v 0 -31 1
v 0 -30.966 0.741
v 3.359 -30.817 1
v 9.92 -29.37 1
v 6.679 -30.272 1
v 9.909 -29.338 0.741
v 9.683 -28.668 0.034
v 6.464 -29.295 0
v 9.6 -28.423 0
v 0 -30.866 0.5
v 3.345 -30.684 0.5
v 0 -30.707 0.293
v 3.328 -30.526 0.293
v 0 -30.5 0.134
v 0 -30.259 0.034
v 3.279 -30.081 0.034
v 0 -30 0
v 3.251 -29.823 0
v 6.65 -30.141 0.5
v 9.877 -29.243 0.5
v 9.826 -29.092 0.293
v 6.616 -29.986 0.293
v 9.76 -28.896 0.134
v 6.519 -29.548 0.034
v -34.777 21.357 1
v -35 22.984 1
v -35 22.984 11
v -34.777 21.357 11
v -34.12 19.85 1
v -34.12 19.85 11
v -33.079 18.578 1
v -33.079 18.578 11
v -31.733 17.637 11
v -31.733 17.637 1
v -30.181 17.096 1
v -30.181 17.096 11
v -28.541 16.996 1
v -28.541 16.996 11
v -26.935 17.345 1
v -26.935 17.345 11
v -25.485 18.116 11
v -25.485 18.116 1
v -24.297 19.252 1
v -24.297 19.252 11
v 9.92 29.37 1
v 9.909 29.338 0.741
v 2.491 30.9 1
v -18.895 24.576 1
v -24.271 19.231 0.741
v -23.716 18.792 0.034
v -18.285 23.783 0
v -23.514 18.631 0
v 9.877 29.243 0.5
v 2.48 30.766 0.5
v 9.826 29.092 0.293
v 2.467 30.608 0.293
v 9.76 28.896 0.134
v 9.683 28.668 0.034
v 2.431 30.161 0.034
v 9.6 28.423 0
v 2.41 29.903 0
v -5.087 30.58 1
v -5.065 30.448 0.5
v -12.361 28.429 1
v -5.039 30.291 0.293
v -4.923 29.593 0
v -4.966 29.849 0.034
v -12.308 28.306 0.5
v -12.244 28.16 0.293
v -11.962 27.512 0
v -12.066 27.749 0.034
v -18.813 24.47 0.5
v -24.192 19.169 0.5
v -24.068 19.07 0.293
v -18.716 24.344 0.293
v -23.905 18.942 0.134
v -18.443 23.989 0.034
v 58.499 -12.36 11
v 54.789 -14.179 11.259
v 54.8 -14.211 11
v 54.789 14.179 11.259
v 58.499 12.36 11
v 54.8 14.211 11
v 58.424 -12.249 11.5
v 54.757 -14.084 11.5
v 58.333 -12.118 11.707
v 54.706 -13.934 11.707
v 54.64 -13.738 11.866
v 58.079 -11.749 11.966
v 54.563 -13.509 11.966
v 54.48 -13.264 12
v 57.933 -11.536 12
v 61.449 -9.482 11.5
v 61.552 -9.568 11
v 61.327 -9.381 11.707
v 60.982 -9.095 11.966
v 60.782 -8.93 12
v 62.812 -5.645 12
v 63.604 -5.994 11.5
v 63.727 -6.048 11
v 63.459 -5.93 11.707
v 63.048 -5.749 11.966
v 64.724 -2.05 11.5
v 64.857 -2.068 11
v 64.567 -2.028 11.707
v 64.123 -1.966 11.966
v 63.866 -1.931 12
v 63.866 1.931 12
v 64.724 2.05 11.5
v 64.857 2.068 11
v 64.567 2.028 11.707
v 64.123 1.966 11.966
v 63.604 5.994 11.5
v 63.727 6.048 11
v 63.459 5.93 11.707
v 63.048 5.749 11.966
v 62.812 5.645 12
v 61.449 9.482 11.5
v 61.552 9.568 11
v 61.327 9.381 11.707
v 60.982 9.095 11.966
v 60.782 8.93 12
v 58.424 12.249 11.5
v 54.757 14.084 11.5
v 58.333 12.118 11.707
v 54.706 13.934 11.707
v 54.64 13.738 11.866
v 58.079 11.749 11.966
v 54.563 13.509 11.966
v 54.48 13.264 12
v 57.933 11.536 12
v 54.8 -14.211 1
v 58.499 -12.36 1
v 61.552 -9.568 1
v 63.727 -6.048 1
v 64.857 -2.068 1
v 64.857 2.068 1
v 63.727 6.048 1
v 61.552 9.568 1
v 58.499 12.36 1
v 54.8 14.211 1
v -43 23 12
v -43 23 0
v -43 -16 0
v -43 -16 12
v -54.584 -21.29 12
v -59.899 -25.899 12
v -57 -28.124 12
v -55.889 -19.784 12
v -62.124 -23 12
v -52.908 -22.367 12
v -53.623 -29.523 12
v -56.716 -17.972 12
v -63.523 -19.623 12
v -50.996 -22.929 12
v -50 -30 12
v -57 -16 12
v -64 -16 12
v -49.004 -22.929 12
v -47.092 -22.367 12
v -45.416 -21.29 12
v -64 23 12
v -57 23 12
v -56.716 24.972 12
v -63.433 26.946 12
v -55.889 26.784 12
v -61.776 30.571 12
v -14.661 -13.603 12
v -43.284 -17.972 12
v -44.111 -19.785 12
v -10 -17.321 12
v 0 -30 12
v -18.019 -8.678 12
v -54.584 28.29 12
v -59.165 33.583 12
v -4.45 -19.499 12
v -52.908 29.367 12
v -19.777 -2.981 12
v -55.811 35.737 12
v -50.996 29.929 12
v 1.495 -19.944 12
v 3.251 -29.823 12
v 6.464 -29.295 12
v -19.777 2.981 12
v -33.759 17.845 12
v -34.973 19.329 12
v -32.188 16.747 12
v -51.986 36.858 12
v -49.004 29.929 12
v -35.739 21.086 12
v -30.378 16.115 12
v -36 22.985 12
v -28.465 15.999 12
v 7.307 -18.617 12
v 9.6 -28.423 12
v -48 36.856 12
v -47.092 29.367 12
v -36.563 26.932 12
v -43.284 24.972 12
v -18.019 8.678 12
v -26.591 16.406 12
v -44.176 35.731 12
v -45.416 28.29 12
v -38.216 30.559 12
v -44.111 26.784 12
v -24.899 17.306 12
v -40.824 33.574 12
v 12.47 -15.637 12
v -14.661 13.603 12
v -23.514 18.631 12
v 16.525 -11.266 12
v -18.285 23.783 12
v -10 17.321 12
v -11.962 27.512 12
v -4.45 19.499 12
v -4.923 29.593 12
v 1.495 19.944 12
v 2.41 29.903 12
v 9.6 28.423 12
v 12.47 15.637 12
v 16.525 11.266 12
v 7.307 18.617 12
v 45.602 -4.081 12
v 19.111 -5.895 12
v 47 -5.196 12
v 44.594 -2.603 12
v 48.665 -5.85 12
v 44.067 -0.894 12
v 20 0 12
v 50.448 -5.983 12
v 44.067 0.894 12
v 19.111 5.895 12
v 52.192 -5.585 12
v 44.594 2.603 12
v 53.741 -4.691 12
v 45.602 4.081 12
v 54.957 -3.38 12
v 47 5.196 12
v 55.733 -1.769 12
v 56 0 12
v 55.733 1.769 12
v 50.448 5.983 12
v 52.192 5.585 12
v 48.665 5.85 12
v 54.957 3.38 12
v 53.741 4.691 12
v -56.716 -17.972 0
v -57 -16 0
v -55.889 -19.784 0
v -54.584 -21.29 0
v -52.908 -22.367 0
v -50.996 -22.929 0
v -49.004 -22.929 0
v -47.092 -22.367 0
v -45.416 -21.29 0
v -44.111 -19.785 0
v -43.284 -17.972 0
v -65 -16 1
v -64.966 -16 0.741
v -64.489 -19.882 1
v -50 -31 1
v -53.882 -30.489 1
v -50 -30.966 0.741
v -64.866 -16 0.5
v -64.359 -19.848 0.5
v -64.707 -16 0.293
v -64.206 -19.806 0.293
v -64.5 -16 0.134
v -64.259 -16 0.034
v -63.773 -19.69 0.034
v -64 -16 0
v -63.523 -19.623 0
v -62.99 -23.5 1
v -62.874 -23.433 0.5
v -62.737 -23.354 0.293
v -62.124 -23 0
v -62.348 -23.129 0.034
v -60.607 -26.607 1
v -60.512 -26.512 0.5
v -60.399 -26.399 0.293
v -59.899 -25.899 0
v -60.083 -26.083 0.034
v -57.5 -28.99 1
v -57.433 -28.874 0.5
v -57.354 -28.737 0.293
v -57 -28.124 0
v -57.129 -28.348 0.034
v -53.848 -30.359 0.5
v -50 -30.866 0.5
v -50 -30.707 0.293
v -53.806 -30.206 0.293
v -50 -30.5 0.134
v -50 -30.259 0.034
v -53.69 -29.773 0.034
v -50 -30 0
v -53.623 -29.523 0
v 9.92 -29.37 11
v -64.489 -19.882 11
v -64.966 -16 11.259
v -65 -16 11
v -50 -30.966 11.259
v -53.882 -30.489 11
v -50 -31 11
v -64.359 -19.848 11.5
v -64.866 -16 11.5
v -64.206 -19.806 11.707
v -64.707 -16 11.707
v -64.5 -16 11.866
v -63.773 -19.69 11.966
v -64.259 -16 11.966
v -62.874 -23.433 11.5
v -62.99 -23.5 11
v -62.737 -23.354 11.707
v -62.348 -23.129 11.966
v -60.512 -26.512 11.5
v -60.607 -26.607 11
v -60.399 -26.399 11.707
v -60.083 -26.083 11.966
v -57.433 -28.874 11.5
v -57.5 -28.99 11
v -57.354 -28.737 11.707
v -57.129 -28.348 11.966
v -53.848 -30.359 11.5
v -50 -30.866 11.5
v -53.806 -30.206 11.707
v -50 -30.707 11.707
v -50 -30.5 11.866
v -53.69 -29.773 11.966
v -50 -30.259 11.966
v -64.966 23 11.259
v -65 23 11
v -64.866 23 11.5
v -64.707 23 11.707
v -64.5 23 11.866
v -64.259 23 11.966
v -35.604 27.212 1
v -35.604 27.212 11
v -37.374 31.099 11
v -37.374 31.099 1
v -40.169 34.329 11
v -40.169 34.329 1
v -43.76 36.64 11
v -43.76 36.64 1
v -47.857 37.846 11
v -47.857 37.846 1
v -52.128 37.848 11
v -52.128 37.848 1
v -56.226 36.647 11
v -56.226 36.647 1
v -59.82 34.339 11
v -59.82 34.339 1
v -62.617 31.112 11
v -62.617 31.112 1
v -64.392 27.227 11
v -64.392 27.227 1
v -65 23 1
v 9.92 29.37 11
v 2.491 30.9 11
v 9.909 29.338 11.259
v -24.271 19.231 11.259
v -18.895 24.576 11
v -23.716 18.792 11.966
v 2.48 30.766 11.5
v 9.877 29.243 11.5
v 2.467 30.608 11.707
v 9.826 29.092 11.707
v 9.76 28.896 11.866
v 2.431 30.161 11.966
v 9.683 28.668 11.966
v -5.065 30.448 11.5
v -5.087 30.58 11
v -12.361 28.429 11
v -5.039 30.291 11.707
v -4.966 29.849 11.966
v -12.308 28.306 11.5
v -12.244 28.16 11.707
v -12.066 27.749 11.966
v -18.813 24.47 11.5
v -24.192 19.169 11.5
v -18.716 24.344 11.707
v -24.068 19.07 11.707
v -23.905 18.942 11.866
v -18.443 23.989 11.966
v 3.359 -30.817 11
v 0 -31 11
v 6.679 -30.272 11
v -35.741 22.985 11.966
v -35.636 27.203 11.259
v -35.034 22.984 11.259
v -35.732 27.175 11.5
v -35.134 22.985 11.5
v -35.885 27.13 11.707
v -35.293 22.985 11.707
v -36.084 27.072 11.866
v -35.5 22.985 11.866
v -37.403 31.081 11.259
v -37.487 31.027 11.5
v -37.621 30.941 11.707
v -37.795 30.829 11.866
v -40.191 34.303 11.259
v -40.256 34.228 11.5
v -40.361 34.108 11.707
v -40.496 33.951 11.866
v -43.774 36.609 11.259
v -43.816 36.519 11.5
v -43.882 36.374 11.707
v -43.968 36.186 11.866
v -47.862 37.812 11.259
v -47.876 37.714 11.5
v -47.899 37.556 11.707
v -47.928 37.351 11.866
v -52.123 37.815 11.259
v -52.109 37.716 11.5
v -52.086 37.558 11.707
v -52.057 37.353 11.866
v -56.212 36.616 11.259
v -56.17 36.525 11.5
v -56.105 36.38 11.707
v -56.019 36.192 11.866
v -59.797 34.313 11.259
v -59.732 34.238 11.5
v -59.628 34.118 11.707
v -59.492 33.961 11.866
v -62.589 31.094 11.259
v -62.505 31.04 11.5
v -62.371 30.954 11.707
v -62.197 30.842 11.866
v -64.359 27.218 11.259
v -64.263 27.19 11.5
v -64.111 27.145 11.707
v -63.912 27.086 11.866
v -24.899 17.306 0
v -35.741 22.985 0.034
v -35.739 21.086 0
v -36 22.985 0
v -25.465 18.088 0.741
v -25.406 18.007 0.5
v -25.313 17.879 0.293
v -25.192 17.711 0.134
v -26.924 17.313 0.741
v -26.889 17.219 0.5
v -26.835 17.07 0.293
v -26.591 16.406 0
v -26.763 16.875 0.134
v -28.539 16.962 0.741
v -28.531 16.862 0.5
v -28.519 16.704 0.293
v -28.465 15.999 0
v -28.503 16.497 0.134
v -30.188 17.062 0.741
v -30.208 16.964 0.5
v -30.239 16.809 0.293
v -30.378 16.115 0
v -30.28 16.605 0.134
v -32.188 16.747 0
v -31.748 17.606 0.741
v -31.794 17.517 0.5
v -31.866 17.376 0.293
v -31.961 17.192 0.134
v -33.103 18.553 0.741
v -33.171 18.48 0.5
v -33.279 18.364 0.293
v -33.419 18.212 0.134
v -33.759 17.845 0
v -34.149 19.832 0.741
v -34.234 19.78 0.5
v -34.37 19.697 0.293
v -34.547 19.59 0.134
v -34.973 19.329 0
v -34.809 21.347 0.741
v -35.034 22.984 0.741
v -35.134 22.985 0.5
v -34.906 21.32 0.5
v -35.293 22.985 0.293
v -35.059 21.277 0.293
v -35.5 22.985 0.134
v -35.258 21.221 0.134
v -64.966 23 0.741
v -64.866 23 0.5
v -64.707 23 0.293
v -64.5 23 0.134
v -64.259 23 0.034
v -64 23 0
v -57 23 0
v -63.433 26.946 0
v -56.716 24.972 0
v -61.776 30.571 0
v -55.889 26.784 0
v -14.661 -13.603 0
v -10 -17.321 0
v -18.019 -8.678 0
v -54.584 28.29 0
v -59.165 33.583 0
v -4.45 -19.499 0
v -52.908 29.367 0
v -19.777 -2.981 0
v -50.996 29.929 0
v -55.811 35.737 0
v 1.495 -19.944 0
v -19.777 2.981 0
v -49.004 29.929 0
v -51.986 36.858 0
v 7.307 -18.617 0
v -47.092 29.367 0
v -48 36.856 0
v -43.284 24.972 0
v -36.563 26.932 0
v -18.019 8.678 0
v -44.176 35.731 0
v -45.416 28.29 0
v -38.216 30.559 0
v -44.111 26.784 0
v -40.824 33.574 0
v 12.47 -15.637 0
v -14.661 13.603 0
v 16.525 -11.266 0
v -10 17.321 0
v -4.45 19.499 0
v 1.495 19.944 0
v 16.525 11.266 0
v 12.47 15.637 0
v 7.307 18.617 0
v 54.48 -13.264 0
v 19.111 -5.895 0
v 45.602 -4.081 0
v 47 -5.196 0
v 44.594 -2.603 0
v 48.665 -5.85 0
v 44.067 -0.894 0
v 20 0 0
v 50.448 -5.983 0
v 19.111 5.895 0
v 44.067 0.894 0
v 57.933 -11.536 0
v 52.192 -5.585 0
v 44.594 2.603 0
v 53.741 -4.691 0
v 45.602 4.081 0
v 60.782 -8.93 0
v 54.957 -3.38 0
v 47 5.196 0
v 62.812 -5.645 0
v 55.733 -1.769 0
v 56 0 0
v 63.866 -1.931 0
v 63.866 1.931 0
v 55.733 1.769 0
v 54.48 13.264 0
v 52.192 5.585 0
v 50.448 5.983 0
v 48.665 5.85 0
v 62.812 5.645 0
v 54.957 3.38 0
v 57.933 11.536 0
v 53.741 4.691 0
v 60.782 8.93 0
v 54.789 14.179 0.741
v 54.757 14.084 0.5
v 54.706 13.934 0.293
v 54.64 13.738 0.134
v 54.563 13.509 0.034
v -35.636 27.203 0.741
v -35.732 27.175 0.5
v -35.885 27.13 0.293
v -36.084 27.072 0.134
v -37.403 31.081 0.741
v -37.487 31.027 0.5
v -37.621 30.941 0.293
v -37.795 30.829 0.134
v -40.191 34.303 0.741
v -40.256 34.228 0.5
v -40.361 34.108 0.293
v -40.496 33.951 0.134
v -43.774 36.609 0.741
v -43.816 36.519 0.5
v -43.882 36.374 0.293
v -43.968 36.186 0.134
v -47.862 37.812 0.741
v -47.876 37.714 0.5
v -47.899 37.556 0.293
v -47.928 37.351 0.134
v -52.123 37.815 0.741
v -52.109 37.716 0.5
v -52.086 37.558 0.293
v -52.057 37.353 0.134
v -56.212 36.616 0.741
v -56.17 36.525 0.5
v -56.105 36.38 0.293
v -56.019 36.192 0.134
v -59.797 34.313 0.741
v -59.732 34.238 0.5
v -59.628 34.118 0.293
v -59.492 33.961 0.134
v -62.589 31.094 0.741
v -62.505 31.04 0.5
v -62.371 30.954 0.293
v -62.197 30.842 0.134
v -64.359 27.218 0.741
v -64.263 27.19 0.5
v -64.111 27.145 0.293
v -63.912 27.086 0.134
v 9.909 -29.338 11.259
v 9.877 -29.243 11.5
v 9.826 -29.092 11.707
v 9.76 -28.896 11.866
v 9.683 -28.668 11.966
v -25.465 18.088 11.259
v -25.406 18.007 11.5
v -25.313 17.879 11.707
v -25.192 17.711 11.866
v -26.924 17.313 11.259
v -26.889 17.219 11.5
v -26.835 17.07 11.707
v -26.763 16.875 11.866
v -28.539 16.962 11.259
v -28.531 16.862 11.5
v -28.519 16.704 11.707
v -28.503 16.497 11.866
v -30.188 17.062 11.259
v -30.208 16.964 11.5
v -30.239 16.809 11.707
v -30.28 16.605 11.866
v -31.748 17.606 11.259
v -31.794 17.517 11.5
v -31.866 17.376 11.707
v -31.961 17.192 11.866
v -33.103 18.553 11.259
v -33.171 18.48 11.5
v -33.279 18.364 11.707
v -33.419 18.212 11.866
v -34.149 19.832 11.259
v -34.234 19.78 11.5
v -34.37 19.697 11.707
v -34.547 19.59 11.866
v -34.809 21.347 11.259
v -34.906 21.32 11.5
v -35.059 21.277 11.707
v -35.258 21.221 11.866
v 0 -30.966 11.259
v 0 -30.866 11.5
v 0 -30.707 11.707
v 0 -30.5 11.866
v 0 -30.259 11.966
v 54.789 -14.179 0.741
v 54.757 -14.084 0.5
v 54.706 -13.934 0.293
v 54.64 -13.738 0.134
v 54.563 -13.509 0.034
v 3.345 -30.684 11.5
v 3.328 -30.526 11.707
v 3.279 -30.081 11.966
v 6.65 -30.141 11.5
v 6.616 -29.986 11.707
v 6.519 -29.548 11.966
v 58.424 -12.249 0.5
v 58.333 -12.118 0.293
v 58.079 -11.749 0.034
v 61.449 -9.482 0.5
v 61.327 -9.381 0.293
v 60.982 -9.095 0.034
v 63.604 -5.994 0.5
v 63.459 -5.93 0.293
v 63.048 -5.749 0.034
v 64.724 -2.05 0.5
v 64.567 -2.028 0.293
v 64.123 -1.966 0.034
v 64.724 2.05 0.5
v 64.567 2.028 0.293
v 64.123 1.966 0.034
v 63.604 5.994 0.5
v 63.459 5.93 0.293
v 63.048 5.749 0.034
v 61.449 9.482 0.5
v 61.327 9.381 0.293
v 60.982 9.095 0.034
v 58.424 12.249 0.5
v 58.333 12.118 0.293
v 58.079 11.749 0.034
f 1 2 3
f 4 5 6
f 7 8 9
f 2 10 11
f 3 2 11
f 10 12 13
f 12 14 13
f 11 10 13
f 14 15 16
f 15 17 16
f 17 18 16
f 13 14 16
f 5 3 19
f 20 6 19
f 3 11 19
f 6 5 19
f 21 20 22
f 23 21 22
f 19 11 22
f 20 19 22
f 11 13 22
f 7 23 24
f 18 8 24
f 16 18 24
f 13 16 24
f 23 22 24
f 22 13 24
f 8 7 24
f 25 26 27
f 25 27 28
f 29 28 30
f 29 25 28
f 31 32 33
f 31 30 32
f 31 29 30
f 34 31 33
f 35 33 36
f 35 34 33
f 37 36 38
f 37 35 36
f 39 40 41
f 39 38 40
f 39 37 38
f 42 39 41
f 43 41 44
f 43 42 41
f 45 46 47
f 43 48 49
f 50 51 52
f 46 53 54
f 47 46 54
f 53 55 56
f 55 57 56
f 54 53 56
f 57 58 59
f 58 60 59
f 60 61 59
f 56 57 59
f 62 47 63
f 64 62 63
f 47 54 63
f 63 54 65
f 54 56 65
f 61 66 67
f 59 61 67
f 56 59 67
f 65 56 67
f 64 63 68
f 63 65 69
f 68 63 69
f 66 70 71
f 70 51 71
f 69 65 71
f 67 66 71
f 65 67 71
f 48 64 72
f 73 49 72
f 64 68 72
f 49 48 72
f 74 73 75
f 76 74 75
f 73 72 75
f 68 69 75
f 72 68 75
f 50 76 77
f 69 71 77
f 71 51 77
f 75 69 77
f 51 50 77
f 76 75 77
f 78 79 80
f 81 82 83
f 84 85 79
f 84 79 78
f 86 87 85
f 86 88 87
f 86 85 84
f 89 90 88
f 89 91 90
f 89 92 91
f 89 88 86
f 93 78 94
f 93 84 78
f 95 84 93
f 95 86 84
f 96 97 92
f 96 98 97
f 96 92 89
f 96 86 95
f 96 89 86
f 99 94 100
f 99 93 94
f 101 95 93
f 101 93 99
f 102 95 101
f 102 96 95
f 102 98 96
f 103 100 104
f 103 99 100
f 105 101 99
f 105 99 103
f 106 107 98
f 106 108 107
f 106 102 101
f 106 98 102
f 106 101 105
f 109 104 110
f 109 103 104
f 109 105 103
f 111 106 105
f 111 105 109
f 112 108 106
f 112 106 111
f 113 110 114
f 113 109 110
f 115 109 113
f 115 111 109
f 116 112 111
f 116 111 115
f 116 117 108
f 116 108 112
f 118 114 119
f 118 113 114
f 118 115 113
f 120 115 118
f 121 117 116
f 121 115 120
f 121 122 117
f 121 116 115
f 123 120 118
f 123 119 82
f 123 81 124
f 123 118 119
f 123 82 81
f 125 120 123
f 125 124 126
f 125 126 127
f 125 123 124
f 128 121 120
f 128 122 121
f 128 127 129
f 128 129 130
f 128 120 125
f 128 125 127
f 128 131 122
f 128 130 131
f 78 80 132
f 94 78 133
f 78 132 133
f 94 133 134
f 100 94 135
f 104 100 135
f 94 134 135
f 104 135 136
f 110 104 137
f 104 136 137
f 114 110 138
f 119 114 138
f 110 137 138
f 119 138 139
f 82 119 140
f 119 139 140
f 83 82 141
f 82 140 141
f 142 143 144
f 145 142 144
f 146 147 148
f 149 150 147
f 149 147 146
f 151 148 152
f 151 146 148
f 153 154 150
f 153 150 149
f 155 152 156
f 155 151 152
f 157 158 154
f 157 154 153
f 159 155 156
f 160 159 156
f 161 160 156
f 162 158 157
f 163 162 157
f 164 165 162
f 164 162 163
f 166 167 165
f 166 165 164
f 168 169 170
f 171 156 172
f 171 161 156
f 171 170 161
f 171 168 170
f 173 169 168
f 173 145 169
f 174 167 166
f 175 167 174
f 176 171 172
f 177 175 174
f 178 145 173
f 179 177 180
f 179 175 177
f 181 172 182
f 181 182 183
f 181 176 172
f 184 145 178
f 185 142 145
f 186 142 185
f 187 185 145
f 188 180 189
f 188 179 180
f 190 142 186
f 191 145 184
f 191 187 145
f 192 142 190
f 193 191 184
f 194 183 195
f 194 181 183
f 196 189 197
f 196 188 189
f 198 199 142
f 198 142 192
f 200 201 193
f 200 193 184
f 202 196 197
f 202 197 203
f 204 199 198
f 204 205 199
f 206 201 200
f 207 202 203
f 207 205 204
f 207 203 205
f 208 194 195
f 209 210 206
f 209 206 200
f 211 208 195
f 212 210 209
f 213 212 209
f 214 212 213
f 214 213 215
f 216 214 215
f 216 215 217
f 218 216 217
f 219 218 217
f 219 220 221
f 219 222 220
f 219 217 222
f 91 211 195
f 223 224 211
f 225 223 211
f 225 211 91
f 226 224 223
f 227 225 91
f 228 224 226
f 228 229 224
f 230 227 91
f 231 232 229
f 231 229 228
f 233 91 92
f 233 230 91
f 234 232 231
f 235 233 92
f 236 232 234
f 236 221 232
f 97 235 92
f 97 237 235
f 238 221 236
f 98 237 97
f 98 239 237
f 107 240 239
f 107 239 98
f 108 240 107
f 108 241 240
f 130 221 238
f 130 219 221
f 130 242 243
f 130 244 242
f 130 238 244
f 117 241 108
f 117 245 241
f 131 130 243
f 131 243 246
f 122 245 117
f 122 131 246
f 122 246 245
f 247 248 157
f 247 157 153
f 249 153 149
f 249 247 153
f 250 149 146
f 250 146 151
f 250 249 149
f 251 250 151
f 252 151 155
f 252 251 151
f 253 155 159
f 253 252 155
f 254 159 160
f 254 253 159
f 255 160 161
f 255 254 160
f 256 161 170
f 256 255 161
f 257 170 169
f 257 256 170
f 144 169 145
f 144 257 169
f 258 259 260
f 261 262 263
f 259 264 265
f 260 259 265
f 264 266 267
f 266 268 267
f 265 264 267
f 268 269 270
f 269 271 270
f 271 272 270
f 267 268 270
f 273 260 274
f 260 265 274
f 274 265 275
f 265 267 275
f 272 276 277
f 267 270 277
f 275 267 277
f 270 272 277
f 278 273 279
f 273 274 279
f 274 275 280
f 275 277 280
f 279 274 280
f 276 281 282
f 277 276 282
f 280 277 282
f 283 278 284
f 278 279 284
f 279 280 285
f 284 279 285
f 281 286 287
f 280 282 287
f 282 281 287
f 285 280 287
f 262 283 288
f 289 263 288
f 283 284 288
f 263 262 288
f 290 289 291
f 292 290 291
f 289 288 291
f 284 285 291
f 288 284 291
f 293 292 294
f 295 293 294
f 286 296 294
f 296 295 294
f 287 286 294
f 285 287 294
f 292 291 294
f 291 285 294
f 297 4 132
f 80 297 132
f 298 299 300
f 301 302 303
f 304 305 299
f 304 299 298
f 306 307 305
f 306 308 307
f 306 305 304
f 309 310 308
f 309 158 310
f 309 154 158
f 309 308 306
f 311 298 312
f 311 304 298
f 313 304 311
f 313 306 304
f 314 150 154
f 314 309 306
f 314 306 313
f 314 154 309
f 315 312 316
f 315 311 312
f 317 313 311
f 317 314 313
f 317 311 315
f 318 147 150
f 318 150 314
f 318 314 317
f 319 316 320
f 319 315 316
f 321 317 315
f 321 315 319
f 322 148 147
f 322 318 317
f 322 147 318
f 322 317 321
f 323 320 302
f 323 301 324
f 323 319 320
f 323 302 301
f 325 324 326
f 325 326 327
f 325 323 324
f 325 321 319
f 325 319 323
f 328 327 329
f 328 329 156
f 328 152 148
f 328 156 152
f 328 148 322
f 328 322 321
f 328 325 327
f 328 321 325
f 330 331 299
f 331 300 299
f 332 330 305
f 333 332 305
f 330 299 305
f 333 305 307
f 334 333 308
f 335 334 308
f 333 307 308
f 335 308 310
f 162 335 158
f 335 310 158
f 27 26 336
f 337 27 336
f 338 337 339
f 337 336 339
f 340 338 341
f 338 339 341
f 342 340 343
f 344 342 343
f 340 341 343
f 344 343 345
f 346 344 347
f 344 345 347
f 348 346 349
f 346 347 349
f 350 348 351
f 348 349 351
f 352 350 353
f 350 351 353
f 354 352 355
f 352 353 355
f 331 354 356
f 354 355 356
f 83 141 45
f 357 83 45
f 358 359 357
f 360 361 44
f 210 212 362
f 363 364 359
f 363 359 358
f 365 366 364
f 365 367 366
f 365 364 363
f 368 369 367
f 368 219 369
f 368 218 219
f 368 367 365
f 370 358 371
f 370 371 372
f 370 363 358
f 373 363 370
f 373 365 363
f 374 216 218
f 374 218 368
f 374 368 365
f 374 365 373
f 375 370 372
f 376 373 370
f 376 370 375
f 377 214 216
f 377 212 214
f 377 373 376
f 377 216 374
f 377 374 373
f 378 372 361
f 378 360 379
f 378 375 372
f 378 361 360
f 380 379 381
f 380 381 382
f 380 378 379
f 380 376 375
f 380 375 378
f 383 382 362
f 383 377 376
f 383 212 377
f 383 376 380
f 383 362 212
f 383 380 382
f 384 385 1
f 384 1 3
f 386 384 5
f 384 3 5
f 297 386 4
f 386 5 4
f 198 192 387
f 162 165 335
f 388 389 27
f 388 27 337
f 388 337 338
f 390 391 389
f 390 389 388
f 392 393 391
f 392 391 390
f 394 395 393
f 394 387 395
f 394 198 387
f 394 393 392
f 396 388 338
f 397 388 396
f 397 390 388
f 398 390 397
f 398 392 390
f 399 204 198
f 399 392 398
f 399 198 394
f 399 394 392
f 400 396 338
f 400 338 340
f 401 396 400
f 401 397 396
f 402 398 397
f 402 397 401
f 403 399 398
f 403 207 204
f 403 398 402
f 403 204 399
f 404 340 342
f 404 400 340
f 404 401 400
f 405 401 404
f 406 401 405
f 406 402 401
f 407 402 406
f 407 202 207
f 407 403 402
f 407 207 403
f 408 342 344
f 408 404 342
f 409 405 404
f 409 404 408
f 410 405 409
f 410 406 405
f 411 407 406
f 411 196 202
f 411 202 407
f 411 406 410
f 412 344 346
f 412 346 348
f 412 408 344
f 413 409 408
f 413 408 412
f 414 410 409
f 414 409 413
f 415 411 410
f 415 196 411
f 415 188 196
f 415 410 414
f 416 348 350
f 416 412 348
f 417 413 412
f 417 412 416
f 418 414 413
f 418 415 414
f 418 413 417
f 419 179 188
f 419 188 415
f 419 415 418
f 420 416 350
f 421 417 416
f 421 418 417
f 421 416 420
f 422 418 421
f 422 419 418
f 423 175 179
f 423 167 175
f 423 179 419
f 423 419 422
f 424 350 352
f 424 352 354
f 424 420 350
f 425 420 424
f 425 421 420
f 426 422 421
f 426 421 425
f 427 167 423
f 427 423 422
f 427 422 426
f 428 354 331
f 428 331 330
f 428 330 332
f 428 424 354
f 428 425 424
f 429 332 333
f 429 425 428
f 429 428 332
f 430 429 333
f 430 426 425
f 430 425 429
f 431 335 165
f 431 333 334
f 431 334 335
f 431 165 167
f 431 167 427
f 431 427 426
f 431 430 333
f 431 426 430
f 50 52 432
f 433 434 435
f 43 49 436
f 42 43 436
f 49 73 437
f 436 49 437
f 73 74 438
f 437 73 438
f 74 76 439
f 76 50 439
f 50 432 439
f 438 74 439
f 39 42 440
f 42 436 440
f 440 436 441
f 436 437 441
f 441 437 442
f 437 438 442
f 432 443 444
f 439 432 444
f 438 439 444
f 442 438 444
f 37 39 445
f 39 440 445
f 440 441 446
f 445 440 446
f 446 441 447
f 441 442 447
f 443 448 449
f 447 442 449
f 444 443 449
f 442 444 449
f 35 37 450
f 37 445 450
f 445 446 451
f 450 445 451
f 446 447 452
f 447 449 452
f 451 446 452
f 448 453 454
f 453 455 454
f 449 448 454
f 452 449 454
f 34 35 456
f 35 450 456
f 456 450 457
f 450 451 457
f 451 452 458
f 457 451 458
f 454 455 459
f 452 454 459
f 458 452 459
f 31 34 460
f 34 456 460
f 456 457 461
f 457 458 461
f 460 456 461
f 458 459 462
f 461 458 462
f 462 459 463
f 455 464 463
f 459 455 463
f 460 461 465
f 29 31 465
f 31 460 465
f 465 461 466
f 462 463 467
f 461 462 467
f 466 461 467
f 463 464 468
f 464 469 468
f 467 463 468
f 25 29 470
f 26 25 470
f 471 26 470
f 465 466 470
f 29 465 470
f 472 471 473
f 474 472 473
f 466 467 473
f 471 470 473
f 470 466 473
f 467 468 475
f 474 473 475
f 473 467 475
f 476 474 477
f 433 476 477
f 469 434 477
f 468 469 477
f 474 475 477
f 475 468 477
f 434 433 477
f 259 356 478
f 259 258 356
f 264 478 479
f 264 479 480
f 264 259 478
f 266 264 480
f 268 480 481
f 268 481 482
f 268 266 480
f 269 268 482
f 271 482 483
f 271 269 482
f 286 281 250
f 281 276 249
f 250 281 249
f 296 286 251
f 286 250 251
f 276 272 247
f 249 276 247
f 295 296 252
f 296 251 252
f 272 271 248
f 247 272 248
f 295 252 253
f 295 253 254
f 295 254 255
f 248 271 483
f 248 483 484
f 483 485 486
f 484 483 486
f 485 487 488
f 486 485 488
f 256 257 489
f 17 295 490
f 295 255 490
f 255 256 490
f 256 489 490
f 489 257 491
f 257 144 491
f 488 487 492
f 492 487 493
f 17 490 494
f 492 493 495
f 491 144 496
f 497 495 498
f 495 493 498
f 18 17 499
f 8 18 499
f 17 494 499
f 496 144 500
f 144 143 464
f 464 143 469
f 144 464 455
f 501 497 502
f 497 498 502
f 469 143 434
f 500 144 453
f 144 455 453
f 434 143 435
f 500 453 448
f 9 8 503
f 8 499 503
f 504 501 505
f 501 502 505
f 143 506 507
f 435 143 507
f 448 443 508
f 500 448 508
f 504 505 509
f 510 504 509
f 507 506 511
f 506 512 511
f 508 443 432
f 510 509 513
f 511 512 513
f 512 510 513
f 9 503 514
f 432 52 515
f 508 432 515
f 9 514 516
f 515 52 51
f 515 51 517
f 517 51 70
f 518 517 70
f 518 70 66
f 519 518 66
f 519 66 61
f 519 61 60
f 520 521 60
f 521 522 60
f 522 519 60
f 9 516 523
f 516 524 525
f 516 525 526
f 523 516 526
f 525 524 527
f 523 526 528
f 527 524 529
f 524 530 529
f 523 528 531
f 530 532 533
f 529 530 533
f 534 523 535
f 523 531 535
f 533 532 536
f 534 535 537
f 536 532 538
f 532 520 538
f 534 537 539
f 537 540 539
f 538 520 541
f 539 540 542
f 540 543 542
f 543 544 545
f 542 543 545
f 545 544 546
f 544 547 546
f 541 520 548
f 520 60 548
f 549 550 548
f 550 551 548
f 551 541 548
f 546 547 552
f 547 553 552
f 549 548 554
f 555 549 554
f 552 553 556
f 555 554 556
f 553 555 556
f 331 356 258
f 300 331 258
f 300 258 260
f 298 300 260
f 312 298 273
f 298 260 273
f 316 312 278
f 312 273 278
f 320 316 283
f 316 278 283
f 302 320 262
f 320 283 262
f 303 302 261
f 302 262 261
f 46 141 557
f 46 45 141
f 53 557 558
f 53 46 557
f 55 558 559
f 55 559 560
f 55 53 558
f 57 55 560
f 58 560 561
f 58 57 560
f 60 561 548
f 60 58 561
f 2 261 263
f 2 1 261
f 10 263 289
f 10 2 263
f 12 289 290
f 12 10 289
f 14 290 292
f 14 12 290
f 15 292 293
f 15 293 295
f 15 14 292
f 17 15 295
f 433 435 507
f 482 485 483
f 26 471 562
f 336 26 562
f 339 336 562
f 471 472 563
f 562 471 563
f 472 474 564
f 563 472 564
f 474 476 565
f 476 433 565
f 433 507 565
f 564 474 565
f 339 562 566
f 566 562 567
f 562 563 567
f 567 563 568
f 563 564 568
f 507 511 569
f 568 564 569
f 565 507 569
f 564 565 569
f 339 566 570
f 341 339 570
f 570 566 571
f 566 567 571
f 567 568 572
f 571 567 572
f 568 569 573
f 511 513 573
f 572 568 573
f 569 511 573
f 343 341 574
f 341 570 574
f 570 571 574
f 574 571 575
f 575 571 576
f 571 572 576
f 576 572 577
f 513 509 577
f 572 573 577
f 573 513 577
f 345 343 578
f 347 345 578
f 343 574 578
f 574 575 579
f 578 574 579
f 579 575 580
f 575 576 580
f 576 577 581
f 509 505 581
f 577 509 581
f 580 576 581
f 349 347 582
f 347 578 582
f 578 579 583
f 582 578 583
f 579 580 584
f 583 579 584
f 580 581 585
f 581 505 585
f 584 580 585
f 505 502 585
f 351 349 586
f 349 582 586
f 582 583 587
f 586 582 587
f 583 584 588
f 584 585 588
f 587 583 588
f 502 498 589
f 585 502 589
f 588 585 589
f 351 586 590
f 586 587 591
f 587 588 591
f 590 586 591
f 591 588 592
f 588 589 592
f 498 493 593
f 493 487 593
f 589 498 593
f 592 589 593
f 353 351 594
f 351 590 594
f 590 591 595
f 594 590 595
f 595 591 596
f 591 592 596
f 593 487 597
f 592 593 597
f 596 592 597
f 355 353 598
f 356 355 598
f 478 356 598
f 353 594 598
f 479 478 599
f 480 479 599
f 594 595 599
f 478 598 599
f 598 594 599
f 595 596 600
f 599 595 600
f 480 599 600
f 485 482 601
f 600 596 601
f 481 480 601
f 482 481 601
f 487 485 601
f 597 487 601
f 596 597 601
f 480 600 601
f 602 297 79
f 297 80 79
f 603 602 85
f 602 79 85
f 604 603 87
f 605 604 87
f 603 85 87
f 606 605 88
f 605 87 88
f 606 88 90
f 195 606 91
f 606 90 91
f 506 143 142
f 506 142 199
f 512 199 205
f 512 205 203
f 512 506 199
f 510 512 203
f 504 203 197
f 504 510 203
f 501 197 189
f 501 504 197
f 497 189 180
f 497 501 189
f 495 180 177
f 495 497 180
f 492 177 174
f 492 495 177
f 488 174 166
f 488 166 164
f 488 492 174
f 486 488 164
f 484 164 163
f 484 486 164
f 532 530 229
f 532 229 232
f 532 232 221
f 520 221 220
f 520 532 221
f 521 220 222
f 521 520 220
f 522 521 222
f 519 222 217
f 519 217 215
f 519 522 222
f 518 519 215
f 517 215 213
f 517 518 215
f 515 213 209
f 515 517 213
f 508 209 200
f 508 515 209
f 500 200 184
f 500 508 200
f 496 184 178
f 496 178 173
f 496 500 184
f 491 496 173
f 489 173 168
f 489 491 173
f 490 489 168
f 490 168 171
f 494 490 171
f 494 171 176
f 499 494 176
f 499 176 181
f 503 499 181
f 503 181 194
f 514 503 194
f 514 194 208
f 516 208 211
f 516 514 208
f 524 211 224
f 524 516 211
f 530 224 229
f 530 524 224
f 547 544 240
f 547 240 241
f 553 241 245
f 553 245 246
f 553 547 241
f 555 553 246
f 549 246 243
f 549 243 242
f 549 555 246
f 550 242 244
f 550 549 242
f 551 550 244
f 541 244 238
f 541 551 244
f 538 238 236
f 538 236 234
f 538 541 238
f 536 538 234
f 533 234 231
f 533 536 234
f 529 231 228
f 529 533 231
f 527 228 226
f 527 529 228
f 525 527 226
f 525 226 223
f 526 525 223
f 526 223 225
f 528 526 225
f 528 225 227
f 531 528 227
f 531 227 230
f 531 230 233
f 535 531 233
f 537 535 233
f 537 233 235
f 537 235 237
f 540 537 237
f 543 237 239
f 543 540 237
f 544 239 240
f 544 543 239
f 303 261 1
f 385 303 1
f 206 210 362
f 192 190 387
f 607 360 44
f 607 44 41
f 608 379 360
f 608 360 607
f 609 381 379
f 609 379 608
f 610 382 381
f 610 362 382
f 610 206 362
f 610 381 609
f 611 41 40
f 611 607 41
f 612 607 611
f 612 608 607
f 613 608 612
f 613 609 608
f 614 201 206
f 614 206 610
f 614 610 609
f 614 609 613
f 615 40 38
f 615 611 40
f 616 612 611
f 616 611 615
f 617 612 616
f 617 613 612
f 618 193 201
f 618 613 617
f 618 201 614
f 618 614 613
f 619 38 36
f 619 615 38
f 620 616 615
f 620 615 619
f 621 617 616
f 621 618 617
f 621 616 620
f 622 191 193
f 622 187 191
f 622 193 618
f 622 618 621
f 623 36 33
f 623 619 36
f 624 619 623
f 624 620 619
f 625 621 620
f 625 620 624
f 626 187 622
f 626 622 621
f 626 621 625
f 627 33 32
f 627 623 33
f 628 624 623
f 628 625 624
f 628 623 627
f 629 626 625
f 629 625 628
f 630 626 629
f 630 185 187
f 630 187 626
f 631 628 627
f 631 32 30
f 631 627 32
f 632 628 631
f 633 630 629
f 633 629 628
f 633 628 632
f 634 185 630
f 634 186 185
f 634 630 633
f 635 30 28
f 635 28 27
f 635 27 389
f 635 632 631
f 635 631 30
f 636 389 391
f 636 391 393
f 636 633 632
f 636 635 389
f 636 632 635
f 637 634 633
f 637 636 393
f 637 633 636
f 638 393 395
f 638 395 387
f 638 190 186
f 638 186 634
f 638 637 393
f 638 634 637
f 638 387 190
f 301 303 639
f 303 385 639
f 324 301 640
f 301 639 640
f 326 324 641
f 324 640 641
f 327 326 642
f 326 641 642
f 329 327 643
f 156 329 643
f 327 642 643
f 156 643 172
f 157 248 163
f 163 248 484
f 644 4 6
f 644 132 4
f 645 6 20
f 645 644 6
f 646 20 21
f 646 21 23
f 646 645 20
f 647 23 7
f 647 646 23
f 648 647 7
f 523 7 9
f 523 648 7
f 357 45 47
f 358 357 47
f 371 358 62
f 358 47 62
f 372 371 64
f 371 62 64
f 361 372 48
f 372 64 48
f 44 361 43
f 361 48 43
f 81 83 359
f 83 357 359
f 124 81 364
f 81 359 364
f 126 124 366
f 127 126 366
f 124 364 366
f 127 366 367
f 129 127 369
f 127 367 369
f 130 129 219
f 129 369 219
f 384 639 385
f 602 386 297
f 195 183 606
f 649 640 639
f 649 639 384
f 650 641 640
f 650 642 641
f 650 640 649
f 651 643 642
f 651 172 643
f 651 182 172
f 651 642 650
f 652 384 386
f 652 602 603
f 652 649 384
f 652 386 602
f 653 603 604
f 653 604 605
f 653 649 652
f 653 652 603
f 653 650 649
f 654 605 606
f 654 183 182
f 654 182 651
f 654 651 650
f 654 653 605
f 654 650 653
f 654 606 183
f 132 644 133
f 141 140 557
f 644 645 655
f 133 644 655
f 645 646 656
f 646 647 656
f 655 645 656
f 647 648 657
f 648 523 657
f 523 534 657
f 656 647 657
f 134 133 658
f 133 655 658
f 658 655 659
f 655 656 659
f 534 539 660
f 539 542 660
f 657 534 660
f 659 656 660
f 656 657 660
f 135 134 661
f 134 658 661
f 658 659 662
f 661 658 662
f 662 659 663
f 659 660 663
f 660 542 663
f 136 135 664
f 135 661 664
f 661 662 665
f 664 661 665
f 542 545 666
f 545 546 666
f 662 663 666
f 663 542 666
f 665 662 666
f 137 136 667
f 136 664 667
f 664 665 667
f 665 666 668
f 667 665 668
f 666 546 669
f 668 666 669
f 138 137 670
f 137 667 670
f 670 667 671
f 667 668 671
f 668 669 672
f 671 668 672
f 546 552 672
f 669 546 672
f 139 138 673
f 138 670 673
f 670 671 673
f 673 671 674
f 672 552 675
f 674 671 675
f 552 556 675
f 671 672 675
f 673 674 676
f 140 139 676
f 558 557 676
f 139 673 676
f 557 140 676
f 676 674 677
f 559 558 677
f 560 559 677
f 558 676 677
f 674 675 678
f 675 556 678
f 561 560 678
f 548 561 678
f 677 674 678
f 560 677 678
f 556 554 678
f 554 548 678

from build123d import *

# Parameters (mm, degrees)
SKETCH_R    = 20
SKETCH_R_2  = 6
PAD_DEPTH   = 12
FILLET_R    = 1
FILLET001_R = 1


with BuildPart() as part:
    # Sketch → Pad (new body)
    with BuildSketch(Plane.XY):
        with BuildLine():
            ThreePointArc((0, -31), (5.026517, -30.589772), (9.92, -29.369944))
            Line((9.92, -29.369944), (54.8, -14.211263))
            ThreePointArc((54.8, -14.211263), (65, 0), (54.8, 14.211263))
            Line((54.8, 14.211263), (9.919999, 29.369944))
            ThreePointArc((9.919999, 29.369944), (-8.790322, 29.727601), (-24.297307, 19.252036))
            ThreePointArc((-35.000008, 22.984455), (-30.975734, 17.312857), (-24.297307, 19.252036))
            ThreePointArc((-35.000008, 22.984455), (-49.992227, 37.999998), (-65, 23))
            Line((-65, 23), (-65, -16))
            ThreePointArc((-65, -16), (-60.606602, -26.606602), (-50, -31))
            Line((-50, -31), (0, -31))
        make_face()
        Circle(SKETCH_R, mode=Mode.SUBTRACT)
        with Locations((50, 0)):
            Circle(SKETCH_R_2, mode=Mode.SUBTRACT)
        with BuildLine():
            ThreePointArc((-57, -16), (-50.000013, -23), (-43, -16.000027))
            Line((-43, 23), (-43, -16.000027))
            ThreePointArc((-43, 23), (-50, 30), (-57, 23))
            Line((-57, -16), (-57, 23))
        make_face(mode=Mode.SUBTRACT)
    extrude(amount=PAD_DEPTH)

    # Fillet
    fillet_edges = [part.edges().sort_by_distance(p)[0] for p in [
        (32.36, -21.790603, 12),
        (5.026517, -30.589772, 12),
        (-25, -31, 12),
        (-60.606602, -26.606602, 12),
        (-65, 3.5, 12),
        (-49.992227, 37.999998, 12),
        (-30.975734, 17.312857, 12),
        (-8.790322, 29.727601, 12),
        (32.36, 21.790604, 12),
        (65, 0, 12),
    ]]
    fillet(fillet_edges, radius=FILLET_R)

    # Fillet001
    fillet001_edges = [part.edges().sort_by_distance(p)[0] for p in [
        (5.026517, -30.589772, 0),
        (-25, -31, 0),
        (-60.606602, -26.606602, 0),
        (-65, 3.5, 0),
        (-49.992227, 37.999998, 0),
        (-30.975734, 17.312857, 0),
        (-8.790322, 29.727601, 0),
        (32.36, 21.790604, 0),
        (65, 0, 0),
        (32.36, -21.790603, 0),
    ]]
    fillet(fillet001_edges, radius=FILLET001_R)


solid = part.part
